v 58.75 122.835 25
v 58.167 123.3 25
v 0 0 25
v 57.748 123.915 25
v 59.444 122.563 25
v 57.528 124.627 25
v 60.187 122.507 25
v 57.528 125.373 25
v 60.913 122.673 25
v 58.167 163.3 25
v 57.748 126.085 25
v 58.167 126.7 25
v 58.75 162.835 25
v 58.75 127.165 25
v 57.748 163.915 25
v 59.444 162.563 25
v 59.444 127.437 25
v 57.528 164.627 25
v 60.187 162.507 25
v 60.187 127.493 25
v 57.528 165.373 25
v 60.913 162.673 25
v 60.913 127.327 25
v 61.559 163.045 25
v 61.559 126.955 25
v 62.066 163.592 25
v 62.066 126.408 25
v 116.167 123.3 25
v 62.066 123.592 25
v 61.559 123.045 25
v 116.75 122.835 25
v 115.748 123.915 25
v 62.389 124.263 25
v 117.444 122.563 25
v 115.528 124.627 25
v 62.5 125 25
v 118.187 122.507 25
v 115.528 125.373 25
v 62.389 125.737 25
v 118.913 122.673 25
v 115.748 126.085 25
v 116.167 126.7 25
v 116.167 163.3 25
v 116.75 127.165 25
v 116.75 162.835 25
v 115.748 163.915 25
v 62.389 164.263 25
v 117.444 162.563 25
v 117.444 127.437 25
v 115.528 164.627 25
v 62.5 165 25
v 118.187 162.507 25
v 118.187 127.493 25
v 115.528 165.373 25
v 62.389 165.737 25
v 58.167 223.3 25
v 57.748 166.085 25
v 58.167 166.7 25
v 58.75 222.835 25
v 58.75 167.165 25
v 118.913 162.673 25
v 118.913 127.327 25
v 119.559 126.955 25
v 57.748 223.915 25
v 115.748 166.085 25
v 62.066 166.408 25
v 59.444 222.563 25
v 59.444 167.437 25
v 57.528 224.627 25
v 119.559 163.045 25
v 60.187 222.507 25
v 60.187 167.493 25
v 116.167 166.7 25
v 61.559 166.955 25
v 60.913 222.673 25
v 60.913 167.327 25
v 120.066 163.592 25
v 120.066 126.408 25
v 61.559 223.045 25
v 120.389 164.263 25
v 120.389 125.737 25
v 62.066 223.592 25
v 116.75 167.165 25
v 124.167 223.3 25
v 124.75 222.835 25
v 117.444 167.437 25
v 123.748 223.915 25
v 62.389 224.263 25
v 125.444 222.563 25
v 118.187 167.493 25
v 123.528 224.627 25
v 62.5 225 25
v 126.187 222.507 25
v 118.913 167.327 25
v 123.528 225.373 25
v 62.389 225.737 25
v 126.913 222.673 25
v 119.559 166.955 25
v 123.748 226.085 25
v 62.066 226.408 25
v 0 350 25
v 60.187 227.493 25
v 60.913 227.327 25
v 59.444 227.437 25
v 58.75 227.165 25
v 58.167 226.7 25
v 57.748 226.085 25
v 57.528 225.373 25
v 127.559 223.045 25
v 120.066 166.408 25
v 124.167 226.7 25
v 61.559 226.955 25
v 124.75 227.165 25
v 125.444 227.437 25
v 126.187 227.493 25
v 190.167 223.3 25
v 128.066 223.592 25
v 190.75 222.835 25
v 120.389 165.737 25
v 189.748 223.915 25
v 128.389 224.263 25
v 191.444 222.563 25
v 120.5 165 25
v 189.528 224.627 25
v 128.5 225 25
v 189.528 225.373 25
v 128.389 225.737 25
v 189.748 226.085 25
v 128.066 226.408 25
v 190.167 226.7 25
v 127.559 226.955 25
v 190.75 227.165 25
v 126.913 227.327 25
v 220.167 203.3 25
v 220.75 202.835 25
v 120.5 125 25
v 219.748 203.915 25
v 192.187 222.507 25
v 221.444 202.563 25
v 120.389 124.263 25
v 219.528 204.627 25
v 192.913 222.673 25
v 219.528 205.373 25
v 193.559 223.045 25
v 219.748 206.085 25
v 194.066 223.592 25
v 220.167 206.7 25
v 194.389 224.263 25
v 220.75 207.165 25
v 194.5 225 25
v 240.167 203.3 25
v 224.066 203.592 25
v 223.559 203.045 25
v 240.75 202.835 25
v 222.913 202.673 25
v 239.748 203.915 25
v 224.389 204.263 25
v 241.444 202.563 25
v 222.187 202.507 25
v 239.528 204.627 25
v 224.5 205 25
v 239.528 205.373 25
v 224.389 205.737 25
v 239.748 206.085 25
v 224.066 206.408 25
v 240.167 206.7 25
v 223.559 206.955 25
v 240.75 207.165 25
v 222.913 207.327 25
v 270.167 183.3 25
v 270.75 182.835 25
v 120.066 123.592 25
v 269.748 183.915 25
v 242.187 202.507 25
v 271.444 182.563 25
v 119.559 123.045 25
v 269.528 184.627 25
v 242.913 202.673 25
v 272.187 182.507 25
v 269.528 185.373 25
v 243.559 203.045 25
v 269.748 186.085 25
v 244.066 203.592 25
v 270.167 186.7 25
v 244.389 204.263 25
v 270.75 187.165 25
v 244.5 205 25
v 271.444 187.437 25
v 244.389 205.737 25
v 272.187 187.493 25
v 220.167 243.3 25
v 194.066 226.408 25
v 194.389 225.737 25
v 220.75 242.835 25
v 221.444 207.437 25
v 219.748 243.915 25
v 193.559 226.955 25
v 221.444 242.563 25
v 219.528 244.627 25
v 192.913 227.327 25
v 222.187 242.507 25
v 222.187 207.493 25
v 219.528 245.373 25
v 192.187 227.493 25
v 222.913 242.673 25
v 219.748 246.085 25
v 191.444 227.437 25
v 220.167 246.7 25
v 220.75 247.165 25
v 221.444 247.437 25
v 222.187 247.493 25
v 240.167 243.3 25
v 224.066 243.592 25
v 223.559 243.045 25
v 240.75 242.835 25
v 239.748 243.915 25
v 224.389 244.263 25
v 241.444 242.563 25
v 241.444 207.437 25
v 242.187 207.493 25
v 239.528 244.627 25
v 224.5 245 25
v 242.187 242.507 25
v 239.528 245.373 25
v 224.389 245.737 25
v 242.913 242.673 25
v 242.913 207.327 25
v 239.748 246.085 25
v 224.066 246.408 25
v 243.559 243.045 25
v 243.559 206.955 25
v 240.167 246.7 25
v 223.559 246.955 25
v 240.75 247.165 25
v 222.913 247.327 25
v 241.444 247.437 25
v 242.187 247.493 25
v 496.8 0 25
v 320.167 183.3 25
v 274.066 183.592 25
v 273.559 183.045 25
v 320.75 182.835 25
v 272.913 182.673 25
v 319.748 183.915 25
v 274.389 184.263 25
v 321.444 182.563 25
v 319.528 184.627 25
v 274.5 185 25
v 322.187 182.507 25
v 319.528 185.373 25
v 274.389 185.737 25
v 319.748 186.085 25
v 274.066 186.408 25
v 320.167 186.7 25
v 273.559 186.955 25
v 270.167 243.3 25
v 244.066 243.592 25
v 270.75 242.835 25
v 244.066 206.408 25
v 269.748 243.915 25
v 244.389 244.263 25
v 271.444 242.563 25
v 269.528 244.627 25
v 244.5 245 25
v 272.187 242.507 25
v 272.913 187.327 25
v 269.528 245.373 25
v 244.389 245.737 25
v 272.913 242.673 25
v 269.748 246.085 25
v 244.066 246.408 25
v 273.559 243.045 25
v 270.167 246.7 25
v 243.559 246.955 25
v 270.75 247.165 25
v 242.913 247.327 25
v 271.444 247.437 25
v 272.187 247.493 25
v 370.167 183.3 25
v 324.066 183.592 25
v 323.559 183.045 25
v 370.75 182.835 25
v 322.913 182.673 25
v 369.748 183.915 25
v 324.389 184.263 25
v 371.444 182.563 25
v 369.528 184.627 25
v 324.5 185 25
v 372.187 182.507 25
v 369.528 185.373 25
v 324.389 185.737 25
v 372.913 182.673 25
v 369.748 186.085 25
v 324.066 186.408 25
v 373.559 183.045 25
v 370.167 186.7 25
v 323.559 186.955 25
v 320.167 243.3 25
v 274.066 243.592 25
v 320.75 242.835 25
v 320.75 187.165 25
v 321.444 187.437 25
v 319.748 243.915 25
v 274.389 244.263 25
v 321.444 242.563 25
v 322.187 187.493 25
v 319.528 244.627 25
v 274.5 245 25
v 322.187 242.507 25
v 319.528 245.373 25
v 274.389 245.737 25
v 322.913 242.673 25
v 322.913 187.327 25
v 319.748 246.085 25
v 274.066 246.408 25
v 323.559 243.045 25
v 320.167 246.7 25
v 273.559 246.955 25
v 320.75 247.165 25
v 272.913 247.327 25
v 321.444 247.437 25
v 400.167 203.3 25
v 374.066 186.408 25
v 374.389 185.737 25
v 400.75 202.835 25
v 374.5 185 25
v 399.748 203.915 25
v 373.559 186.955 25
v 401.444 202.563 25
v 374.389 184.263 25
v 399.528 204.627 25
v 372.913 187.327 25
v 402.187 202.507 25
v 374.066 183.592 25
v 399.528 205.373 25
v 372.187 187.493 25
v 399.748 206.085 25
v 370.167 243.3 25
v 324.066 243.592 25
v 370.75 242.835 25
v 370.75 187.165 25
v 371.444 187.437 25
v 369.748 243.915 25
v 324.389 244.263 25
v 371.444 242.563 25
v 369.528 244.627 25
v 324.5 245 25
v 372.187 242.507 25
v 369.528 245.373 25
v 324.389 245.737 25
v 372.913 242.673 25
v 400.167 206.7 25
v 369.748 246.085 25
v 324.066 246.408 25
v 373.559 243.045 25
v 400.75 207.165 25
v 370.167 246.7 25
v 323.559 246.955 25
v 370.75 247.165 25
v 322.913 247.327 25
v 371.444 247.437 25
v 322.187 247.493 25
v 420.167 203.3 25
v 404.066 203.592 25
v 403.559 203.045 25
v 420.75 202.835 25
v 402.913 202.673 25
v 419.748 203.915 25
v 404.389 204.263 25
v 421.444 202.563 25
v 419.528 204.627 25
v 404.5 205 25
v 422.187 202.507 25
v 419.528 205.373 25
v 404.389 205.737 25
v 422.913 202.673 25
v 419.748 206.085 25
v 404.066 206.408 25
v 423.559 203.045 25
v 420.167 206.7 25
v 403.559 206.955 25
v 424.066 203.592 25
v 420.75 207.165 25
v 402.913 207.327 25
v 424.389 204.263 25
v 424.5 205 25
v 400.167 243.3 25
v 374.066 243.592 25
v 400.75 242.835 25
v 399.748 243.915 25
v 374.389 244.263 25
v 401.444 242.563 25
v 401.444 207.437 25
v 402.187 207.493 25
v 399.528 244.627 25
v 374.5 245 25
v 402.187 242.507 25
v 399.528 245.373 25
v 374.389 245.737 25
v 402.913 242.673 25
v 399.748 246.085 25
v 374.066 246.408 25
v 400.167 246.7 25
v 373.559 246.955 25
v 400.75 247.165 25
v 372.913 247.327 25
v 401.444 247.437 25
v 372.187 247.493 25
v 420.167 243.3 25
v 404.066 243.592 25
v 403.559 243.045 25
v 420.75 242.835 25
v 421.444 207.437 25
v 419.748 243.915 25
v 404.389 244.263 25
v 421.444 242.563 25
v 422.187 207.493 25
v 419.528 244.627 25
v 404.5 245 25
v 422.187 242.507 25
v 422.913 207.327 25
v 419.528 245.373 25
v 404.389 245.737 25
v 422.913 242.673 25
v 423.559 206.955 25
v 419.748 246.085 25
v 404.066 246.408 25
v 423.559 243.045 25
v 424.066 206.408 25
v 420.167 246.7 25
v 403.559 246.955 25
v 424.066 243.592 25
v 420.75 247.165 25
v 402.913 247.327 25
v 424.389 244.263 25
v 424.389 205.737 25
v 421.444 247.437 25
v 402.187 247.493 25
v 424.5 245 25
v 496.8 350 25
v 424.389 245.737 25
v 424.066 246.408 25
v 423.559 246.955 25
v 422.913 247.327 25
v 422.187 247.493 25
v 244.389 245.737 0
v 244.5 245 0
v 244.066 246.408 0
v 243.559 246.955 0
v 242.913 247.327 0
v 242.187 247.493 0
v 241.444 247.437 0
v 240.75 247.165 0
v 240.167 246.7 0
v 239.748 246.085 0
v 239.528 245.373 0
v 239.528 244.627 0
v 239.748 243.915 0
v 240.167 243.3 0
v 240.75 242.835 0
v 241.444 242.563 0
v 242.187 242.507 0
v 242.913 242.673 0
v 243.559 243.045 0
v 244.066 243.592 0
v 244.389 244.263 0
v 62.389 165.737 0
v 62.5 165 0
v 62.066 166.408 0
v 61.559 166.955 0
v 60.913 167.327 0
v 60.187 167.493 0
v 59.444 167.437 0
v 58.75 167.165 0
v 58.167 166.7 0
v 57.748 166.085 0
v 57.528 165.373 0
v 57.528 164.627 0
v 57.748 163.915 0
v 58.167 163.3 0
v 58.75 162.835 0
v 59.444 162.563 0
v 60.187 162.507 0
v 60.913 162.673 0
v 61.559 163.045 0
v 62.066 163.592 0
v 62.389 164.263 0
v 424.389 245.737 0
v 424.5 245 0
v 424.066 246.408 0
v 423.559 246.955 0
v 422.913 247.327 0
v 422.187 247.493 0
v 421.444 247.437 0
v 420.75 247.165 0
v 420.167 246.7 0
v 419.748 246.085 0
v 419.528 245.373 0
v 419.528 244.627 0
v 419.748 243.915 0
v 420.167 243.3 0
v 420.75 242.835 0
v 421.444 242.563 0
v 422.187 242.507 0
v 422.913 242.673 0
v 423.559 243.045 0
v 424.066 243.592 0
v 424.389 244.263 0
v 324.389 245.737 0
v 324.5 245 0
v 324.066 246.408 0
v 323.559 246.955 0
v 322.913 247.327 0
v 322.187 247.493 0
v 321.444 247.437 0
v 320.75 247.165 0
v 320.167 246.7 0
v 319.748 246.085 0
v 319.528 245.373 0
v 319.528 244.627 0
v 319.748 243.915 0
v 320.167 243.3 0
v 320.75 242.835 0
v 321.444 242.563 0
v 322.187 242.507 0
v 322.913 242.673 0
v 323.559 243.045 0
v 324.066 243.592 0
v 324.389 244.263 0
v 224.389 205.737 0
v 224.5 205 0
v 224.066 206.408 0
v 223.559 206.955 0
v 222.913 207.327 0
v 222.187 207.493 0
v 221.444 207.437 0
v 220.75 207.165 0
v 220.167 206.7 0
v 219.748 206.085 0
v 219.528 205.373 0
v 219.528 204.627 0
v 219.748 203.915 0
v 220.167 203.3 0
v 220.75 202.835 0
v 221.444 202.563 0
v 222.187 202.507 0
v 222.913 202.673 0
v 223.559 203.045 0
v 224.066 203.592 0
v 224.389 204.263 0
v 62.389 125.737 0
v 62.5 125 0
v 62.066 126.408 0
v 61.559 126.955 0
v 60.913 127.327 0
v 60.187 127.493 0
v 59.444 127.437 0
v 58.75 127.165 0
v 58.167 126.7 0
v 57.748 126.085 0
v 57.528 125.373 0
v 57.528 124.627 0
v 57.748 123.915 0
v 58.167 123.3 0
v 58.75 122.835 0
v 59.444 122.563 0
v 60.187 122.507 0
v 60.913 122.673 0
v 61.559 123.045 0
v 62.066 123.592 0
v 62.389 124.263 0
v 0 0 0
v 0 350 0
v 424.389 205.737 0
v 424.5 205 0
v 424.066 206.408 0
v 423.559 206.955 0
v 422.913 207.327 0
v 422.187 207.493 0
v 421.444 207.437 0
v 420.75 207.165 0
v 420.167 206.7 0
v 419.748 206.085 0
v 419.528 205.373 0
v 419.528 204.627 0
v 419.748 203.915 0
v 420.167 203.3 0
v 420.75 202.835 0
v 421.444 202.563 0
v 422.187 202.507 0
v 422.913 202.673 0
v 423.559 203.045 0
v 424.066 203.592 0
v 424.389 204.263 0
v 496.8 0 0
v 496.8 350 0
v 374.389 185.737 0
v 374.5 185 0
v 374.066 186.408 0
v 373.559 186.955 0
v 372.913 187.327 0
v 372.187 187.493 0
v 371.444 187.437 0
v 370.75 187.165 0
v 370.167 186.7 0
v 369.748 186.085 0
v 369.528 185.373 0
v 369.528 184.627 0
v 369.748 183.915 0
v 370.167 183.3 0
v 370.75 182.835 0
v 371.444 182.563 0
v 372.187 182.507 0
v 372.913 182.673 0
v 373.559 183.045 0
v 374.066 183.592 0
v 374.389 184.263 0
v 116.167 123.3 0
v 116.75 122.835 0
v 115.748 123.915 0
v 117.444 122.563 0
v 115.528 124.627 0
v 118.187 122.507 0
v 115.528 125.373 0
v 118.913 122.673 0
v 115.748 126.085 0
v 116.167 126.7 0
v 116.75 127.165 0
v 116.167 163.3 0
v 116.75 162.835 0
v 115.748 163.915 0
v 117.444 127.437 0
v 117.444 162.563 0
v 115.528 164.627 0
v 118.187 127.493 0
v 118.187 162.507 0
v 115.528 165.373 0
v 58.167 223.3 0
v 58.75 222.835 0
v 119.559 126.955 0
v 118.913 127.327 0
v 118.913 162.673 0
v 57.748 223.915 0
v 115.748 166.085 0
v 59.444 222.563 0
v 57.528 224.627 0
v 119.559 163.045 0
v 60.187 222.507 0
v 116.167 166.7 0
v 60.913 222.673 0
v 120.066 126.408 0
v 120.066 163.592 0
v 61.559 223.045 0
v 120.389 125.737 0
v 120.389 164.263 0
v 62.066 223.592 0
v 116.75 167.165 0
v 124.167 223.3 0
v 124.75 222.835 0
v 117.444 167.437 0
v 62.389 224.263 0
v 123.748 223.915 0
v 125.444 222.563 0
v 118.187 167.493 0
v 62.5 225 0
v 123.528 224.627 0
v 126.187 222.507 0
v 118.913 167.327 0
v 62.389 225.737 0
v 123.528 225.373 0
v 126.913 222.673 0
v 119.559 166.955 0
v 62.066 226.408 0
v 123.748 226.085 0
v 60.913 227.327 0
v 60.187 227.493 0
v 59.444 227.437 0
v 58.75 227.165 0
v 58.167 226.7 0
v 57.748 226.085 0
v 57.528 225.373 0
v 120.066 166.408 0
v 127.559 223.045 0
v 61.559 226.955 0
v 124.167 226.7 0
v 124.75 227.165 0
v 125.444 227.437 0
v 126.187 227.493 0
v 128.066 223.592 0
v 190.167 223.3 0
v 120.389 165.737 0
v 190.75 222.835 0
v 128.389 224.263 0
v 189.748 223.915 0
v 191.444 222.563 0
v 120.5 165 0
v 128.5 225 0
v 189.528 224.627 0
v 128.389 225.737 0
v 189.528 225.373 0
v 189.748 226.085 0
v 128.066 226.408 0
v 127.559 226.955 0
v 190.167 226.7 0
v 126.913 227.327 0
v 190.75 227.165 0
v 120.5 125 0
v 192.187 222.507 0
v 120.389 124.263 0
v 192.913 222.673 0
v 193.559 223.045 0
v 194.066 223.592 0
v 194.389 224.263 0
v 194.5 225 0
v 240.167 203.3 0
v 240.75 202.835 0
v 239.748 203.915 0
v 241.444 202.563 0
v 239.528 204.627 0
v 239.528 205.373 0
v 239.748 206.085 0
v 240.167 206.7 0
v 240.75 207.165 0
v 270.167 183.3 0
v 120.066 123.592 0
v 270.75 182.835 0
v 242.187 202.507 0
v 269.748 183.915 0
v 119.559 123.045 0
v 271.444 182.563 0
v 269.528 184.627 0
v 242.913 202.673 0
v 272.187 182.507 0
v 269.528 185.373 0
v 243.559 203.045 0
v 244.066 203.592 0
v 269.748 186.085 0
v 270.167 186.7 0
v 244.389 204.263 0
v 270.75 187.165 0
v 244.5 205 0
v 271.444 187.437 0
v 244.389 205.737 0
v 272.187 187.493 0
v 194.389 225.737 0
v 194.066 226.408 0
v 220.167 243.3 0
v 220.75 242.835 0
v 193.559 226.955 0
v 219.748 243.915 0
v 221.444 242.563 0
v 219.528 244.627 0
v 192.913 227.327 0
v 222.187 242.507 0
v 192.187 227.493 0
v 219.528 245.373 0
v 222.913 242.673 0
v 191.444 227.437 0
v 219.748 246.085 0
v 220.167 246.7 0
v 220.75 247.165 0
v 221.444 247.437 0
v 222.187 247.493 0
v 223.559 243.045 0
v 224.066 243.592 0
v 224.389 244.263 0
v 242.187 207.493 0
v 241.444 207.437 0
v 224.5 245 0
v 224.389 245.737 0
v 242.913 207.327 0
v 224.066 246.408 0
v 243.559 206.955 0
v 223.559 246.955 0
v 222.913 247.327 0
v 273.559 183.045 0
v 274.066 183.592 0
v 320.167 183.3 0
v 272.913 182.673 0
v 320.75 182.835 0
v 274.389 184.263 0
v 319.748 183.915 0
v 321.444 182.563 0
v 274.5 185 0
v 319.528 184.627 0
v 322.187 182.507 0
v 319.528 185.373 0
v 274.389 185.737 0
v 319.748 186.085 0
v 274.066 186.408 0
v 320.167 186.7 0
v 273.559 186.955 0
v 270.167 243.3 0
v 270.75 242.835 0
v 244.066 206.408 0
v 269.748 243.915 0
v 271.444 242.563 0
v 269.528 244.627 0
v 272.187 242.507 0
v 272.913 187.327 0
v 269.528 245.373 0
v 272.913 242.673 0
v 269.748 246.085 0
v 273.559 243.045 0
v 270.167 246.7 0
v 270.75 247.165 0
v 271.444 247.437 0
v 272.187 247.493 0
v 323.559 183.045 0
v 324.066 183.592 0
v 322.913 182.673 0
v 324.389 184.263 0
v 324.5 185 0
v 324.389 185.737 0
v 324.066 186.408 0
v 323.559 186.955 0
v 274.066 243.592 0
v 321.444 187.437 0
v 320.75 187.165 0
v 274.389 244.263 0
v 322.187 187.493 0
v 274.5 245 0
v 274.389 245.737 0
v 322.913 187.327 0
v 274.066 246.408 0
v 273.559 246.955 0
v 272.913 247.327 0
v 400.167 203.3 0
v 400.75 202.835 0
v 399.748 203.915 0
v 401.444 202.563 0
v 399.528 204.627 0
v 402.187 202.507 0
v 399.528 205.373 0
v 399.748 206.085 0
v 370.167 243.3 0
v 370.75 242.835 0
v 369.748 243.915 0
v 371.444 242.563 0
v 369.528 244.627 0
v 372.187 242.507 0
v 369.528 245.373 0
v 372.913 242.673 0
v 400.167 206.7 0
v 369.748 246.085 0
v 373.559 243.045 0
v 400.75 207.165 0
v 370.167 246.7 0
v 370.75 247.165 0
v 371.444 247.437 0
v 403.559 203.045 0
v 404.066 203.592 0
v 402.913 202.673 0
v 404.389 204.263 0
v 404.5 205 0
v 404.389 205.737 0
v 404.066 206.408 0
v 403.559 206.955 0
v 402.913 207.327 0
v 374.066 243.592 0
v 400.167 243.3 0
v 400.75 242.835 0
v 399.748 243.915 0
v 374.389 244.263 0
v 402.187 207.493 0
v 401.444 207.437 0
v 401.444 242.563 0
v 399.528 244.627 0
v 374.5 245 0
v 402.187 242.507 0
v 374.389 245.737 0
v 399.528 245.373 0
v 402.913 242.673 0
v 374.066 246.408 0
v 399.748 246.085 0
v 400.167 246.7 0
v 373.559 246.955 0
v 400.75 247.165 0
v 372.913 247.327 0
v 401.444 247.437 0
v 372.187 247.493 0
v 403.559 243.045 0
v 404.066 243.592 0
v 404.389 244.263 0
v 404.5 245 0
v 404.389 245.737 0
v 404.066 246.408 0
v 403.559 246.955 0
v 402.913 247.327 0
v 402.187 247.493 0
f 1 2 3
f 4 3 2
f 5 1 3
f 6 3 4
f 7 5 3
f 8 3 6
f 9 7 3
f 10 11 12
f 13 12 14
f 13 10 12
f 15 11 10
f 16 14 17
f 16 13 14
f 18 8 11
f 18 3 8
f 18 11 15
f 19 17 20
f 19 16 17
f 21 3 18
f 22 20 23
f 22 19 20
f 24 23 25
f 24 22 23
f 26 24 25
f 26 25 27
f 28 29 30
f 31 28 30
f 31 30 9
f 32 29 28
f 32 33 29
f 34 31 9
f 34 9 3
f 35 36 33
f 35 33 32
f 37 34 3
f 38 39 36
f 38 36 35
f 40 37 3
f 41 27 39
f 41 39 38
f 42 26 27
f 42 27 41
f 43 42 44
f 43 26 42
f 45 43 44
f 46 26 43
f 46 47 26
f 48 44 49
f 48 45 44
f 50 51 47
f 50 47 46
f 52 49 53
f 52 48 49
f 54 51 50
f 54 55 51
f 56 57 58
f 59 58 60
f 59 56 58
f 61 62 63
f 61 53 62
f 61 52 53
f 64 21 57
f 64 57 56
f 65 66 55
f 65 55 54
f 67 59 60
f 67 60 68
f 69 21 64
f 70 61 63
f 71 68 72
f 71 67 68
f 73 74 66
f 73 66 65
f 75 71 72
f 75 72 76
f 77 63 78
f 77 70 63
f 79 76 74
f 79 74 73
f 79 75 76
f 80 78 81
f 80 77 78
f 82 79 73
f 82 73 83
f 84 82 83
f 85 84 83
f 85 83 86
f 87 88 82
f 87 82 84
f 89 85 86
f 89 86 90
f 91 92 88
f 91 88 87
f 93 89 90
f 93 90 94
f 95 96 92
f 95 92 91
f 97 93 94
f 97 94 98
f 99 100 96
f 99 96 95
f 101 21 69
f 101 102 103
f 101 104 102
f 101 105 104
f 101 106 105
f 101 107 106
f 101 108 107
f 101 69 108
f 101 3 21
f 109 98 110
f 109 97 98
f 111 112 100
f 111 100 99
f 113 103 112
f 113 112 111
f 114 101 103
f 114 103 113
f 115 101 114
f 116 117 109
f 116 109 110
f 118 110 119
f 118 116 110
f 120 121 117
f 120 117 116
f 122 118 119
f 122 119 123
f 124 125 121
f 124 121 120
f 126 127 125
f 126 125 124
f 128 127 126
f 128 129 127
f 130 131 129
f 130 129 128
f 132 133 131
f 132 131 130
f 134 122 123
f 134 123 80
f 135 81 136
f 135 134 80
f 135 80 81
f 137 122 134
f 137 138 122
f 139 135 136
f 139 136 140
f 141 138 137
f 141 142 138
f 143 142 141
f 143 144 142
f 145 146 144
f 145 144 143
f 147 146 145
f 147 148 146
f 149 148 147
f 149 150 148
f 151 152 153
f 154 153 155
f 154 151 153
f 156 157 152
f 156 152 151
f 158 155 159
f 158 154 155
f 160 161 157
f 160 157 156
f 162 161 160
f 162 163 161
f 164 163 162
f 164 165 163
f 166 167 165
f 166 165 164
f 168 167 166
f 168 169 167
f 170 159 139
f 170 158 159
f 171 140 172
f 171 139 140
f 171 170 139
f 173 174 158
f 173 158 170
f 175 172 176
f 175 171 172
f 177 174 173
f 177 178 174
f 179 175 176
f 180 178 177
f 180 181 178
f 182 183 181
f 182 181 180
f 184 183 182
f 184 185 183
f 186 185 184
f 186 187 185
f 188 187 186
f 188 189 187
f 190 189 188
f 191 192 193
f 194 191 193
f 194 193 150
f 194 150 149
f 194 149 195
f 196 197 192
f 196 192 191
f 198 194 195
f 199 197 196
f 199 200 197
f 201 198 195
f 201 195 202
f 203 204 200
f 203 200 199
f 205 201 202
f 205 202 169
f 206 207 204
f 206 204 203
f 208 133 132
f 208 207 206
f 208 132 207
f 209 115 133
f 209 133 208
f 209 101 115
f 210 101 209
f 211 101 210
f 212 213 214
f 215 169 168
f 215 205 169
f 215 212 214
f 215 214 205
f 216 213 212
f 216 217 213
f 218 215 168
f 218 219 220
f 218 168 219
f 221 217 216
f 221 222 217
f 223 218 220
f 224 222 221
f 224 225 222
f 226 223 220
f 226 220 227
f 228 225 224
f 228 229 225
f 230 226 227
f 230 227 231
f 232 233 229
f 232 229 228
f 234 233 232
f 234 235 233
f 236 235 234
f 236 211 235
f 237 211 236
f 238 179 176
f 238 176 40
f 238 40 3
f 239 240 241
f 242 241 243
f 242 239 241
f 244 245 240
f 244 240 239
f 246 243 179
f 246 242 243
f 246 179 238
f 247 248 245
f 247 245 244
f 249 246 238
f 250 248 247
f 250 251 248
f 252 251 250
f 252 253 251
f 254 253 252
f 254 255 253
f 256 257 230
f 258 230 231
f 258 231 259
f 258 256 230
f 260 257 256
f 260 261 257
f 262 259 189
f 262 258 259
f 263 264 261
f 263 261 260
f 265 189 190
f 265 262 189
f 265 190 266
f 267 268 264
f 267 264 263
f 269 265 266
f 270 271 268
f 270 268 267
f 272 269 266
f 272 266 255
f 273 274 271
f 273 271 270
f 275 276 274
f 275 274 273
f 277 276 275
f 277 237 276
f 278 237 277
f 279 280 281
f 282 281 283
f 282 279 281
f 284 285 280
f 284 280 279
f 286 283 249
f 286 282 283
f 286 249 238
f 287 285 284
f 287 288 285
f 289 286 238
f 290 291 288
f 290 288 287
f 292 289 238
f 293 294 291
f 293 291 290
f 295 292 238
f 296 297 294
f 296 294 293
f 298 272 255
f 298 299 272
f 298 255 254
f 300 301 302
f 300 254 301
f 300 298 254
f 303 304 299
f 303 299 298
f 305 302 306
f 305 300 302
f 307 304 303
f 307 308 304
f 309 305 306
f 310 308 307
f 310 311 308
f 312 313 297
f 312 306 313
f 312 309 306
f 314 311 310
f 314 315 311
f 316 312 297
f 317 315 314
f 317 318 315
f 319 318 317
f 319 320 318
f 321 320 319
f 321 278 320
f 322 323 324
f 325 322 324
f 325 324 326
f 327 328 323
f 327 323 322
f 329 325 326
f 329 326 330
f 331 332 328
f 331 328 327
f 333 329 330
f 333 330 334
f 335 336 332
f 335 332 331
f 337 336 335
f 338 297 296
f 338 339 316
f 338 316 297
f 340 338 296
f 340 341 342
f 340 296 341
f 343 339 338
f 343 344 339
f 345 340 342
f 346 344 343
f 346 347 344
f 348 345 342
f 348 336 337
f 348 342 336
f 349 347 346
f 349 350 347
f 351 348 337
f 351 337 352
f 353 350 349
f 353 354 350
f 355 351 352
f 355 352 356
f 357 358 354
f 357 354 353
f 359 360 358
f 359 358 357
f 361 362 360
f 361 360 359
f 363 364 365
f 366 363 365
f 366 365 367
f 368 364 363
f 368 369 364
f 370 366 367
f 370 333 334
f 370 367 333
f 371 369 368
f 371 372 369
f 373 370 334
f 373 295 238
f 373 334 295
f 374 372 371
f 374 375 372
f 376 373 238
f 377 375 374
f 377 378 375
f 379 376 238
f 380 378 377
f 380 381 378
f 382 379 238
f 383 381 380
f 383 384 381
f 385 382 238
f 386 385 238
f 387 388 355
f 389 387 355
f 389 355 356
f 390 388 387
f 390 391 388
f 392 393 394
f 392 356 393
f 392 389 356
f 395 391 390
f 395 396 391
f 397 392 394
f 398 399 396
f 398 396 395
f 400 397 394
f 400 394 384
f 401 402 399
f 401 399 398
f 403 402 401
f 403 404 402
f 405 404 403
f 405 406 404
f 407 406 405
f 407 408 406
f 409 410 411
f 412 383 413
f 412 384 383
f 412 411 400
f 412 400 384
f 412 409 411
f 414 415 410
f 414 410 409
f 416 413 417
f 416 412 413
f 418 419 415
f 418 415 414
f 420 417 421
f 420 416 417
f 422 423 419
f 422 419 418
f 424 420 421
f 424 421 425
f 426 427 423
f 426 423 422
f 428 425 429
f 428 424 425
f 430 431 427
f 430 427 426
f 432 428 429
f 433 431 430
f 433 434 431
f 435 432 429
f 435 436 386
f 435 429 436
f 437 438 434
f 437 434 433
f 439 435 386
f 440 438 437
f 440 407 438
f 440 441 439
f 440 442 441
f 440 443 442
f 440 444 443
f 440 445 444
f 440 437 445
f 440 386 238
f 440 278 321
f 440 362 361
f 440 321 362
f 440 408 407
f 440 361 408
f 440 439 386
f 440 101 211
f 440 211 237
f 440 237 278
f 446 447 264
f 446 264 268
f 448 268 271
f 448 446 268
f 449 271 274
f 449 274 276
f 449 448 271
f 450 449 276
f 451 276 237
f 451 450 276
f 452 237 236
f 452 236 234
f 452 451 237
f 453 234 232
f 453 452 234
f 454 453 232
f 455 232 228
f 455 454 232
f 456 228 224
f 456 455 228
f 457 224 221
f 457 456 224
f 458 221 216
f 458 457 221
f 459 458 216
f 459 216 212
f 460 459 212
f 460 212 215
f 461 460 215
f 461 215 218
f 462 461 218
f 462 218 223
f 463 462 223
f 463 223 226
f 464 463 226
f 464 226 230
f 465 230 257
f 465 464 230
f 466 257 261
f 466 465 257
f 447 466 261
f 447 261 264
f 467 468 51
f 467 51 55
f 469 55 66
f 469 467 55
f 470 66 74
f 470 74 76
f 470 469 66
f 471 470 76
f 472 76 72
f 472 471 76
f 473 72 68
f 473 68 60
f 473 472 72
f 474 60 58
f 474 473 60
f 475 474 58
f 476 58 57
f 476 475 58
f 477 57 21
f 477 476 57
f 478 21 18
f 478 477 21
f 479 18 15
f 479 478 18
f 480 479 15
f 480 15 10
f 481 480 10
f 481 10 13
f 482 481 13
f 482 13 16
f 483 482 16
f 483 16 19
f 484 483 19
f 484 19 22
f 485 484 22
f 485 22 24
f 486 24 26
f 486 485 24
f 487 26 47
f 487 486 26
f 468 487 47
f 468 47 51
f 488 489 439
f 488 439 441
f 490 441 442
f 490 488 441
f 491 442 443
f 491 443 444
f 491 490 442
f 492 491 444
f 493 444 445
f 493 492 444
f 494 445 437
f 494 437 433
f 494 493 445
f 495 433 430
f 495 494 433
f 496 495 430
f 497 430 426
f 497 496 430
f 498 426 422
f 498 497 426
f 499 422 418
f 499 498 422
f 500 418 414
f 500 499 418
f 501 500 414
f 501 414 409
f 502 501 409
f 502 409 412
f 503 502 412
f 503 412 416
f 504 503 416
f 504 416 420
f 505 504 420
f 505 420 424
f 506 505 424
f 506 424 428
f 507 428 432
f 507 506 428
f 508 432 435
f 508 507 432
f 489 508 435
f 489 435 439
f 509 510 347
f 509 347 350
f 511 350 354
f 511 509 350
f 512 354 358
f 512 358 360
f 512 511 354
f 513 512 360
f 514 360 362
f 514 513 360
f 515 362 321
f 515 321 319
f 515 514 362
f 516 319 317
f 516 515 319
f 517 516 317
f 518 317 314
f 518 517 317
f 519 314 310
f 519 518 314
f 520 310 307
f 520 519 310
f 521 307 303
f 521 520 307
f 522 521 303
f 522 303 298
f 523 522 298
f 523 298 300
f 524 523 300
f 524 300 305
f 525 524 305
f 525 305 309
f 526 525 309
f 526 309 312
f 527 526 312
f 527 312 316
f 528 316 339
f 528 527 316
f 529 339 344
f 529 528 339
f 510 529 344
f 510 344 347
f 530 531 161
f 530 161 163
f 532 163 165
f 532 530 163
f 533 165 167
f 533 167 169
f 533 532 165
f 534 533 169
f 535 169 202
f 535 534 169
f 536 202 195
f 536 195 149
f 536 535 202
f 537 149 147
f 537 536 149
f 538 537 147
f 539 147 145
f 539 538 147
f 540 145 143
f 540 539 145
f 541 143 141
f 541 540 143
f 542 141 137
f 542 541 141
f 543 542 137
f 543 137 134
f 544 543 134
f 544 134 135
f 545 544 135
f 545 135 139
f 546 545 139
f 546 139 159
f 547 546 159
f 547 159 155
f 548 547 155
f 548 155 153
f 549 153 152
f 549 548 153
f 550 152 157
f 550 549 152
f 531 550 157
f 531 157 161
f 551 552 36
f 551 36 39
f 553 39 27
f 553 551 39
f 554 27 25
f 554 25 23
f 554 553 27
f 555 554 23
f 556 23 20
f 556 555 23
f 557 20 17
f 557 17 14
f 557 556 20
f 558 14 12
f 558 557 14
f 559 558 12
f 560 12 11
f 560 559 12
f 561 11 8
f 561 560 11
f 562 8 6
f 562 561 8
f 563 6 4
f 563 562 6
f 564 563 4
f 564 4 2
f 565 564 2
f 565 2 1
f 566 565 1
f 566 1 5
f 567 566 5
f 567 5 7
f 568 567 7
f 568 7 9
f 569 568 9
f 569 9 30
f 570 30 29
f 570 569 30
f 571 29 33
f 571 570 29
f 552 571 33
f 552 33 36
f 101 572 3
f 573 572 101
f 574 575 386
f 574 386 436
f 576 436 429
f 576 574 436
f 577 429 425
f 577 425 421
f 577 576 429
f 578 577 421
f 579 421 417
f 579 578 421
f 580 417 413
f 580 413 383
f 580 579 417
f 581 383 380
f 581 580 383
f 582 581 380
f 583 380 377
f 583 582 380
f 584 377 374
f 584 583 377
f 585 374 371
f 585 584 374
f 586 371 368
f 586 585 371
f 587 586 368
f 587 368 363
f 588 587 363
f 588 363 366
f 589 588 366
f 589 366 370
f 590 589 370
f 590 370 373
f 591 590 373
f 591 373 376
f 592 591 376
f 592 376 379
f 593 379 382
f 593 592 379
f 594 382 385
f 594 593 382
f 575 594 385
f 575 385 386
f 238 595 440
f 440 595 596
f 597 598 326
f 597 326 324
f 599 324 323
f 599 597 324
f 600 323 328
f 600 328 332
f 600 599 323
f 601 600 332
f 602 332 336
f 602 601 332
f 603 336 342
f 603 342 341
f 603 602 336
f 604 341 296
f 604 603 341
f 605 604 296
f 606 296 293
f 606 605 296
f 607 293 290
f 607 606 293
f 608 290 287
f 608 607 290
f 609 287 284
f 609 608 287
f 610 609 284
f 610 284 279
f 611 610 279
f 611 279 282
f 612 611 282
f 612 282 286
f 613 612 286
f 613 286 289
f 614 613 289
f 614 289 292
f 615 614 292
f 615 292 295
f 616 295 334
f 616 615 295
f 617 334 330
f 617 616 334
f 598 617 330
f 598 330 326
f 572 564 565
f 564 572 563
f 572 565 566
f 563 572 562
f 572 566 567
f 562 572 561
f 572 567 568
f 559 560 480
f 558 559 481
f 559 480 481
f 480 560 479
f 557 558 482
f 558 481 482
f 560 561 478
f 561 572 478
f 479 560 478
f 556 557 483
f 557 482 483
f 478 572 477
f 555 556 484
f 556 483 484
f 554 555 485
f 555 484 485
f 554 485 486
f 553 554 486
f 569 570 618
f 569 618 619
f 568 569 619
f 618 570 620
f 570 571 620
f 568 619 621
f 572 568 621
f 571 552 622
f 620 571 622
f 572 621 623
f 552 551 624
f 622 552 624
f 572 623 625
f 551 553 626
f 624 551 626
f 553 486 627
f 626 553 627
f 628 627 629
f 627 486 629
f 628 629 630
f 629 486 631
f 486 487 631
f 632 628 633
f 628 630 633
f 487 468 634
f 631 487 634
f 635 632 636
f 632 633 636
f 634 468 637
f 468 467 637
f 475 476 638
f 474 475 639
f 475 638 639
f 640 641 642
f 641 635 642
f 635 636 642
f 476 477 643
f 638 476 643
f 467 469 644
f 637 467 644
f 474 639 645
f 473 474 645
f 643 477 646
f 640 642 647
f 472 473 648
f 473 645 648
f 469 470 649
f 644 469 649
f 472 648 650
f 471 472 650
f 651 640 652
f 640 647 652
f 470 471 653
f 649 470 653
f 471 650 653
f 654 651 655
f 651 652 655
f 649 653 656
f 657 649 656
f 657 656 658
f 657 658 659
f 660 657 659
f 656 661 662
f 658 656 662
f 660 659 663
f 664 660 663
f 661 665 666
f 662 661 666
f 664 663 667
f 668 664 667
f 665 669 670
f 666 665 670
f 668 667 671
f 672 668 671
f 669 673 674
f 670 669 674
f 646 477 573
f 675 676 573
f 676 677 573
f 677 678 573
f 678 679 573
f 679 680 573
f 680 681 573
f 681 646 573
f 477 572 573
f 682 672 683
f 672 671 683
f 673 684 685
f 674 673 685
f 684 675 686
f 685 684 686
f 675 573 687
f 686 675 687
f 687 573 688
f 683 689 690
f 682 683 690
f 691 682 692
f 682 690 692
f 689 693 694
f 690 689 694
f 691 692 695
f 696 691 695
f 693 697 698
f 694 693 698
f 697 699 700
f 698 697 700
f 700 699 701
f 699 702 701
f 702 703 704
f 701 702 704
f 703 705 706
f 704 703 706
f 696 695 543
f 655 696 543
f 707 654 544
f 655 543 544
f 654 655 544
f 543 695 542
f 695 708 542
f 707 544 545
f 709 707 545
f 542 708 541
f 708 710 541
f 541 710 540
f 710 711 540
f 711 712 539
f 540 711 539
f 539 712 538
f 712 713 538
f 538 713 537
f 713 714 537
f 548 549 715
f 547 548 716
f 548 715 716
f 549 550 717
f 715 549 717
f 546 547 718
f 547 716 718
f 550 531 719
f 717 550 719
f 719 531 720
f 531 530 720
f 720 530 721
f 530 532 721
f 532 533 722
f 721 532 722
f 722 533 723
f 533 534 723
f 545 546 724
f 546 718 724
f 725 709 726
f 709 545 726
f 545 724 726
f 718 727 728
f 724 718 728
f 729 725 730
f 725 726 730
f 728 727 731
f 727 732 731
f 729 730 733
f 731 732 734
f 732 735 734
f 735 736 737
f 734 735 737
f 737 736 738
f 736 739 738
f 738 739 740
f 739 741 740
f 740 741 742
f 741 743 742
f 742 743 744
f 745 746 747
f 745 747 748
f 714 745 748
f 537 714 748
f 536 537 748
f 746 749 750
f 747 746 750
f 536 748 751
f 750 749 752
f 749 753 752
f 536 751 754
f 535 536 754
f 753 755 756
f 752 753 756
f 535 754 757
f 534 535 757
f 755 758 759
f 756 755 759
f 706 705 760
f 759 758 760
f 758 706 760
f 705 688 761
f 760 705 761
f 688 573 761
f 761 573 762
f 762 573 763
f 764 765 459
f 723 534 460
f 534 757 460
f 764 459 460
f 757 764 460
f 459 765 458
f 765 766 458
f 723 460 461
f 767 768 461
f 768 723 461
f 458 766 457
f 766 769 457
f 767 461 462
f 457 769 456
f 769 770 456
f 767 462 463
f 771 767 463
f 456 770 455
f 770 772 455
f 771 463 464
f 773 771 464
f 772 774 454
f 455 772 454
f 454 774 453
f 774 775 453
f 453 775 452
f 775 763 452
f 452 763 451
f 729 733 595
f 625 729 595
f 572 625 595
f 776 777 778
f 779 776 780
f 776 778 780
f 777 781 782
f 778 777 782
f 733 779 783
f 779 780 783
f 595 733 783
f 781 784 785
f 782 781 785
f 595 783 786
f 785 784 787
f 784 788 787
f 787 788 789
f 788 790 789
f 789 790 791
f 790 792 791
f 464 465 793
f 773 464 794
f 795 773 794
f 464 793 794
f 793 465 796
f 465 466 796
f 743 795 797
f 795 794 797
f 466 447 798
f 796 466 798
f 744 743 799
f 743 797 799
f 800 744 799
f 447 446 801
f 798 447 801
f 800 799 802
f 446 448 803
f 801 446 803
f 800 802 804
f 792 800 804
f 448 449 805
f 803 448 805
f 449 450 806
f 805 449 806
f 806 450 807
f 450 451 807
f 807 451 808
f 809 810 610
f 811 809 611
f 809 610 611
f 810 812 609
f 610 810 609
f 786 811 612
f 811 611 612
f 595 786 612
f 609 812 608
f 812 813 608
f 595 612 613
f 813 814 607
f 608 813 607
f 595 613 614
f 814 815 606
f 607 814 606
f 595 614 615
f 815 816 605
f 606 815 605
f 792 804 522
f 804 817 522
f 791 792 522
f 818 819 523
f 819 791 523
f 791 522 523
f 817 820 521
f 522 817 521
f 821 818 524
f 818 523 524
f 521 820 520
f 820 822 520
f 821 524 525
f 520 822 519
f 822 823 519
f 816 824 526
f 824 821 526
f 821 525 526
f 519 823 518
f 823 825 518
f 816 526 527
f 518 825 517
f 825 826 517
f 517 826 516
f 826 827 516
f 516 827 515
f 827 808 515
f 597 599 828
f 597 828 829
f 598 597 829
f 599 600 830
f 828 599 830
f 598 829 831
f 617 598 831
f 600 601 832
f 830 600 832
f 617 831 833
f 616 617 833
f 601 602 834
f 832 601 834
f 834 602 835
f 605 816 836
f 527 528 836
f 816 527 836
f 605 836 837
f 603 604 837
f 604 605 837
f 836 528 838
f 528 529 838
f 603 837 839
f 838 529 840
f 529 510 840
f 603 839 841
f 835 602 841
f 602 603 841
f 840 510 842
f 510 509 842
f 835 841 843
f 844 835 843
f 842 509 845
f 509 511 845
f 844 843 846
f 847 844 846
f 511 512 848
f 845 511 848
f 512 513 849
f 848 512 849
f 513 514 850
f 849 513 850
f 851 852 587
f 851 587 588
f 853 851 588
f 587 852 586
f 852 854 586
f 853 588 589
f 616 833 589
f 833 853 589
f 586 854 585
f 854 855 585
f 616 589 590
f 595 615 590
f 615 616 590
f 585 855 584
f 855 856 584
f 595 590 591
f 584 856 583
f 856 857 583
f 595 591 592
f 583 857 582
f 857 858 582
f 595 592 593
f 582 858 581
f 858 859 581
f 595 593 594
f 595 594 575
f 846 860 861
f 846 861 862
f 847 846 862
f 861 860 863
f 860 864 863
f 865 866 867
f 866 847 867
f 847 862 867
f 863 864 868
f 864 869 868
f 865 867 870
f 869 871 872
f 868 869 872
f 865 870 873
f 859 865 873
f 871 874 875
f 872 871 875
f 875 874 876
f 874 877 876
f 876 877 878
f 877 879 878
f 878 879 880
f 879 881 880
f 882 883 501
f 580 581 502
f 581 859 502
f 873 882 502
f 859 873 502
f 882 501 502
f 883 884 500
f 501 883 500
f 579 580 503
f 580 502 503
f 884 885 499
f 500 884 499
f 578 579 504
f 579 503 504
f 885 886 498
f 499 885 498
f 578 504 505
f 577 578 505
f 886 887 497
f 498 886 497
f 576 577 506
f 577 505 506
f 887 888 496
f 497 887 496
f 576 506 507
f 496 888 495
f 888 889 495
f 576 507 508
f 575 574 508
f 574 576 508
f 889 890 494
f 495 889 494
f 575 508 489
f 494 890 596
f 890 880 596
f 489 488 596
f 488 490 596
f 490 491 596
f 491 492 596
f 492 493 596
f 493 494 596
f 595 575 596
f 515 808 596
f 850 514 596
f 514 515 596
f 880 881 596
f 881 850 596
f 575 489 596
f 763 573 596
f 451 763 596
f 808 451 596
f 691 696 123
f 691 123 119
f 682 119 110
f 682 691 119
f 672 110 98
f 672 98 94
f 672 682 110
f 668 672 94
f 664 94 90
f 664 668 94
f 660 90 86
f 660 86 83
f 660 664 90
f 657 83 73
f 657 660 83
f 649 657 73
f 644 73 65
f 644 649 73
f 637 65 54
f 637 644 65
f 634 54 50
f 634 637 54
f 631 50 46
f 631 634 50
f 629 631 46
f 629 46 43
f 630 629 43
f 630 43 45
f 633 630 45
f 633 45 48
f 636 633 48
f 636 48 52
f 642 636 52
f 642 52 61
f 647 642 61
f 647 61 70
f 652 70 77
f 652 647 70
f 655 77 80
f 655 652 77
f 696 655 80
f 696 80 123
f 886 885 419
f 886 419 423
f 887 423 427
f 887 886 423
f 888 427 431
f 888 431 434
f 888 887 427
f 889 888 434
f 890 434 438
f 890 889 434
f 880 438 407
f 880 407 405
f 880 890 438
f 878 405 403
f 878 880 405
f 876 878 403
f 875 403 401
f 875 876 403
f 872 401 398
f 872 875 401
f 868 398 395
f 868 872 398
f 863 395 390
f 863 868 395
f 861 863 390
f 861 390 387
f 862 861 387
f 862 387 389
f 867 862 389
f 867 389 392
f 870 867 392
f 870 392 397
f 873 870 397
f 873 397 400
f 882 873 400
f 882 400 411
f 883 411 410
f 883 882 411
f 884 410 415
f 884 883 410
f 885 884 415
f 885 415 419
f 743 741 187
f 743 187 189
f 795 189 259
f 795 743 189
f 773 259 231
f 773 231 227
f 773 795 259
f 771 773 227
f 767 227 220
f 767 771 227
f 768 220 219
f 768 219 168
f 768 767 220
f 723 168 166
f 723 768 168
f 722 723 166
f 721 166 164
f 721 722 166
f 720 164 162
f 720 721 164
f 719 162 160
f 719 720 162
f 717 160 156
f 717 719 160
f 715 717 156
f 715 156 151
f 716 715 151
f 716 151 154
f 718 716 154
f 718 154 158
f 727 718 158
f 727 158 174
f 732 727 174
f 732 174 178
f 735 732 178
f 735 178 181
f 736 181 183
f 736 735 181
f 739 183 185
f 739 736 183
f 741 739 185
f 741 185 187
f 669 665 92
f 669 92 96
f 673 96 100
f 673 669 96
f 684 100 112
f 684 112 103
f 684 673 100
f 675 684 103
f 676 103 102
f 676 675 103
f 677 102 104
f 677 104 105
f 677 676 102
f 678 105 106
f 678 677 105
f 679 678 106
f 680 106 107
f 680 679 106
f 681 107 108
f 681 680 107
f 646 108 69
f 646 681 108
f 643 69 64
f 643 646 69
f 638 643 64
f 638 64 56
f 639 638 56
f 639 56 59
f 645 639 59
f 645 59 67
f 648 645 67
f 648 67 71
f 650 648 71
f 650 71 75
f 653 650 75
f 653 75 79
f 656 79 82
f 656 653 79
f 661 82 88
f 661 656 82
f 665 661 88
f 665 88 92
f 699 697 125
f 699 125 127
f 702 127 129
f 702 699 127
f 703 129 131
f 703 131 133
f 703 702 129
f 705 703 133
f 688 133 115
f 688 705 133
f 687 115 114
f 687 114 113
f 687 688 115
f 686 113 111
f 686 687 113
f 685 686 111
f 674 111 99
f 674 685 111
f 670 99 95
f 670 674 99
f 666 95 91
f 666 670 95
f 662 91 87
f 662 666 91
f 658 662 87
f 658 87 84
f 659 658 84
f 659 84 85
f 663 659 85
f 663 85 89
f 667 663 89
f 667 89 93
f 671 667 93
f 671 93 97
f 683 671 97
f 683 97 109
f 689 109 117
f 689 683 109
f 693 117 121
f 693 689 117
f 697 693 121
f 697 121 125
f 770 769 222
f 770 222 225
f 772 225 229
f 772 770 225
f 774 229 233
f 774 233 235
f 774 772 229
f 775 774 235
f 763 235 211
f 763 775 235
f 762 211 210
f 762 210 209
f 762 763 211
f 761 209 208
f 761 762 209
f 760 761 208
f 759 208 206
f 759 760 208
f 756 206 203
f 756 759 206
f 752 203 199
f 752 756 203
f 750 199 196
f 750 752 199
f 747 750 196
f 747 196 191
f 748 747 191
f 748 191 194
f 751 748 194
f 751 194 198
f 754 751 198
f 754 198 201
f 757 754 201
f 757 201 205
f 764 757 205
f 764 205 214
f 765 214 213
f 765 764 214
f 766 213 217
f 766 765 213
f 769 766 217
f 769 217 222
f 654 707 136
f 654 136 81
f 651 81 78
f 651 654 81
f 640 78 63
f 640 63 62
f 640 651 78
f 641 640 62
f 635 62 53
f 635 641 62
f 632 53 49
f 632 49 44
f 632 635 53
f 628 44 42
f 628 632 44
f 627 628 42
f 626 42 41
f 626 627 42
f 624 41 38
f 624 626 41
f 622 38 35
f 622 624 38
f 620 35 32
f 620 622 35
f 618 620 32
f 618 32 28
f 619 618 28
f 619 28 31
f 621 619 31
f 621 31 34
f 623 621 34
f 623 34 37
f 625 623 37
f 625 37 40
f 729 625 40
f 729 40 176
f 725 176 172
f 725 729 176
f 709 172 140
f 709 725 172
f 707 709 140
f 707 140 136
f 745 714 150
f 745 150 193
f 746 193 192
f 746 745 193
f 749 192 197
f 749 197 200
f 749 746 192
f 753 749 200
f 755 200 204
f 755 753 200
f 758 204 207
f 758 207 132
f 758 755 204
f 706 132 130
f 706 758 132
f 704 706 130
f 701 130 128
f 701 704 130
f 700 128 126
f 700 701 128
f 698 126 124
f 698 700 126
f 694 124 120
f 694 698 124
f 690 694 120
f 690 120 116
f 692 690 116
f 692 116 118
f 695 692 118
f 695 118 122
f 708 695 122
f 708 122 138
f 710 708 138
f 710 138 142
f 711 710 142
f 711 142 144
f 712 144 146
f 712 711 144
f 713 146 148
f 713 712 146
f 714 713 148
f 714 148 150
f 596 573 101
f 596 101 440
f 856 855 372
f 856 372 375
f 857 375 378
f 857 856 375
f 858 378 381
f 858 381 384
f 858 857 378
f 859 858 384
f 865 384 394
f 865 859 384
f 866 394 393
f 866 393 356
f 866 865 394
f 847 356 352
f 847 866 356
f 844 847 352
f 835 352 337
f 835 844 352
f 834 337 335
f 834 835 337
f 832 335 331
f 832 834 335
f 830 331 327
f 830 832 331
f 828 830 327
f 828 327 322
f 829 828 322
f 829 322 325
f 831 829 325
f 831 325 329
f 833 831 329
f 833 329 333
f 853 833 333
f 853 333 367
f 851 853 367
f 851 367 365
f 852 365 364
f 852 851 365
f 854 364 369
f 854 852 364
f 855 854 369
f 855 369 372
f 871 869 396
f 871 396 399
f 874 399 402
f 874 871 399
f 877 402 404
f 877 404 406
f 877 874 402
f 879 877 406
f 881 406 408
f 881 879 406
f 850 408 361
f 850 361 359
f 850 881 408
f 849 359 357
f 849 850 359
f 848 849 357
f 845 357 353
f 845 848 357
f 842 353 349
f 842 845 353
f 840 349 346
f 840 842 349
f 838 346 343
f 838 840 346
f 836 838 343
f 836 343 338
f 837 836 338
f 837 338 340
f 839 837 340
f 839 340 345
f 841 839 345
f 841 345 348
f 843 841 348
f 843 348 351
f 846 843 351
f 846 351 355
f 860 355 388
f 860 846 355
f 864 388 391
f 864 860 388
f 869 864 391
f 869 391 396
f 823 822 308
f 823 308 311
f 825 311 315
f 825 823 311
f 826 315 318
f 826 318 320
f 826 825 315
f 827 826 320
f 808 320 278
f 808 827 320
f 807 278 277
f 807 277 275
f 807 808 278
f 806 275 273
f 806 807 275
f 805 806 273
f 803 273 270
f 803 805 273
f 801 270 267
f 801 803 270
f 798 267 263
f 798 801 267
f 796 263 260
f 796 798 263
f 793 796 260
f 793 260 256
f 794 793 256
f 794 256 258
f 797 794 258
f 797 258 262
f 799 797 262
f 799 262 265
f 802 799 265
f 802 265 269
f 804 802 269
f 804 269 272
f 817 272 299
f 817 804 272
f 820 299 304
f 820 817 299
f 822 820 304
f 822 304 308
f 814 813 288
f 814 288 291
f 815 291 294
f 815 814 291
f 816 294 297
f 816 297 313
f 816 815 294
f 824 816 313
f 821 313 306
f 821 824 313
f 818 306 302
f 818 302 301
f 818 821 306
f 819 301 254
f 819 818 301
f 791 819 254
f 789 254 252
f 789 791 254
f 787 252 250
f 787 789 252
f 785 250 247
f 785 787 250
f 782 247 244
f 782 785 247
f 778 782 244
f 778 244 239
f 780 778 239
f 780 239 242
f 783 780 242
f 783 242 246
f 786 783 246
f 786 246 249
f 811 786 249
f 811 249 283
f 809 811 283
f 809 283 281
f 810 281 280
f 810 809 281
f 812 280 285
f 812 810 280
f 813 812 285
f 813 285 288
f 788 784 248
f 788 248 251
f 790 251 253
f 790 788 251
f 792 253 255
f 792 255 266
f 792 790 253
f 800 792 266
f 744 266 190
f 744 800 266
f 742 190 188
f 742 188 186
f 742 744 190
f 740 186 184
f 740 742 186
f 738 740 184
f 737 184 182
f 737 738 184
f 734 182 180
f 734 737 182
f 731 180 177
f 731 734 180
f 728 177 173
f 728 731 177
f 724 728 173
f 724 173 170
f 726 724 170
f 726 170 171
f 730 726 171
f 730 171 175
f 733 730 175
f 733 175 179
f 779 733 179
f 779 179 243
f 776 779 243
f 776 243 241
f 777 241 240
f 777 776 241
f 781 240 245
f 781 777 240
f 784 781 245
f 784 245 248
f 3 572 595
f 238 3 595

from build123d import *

# Parameters (mm, degrees)
F0_W     = 496.8
F0_H     = 350
F0_R     = 2.5
F1_DEPTH = 25


with BuildPart() as f1:
    # F0 (on Top) → F1 (new body)
    with BuildSketch(Plane.XY):
        with Locations((248.4, 175)):
            Rectangle(F0_W, F0_H)
        with Locations((60, 125)):
            Circle(F0_R, mode=Mode.SUBTRACT)
        with Locations((118, 125)):
            Circle(F0_R, mode=Mode.SUBTRACT)
        with Locations((60, 165)):
            Circle(F0_R, mode=Mode.SUBTRACT)
        with Locations((118, 165)):
            Circle(F0_R, mode=Mode.SUBTRACT)
        with Locations((60, 225)):
            Circle(F0_R, mode=Mode.SUBTRACT)
        with Locations((222, 205)):
            Circle(F0_R, mode=Mode.SUBTRACT)
        with Locations((242, 205)):
            Circle(F0_R, mode=Mode.SUBTRACT)
        with Locations((126, 225)):
            Circle(F0_R, mode=Mode.SUBTRACT)
        with Locations((192, 225)):
            Circle(F0_R, mode=Mode.SUBTRACT)
        with Locations((222, 245)):
            Circle(F0_R, mode=Mode.SUBTRACT)
        with Locations((242, 245)):
            Circle(F0_R, mode=Mode.SUBTRACT)
        with Locations((272, 185)):
            Circle(F0_R, mode=Mode.SUBTRACT)
        with Locations((322, 185)):
            Circle(F0_R, mode=Mode.SUBTRACT)
        with Locations((372, 185)):
            Circle(F0_R, mode=Mode.SUBTRACT)
        with Locations((272, 245)):
            Circle(F0_R, mode=Mode.SUBTRACT)
        with Locations((322, 245)):
            Circle(F0_R, mode=Mode.SUBTRACT)
        with Locations((372, 245)):
            Circle(F0_R, mode=Mode.SUBTRACT)
        with Locations((402, 205)):
            Circle(F0_R, mode=Mode.SUBTRACT)
        with Locations((422, 205)):
            Circle(F0_R, mode=Mode.SUBTRACT)
        with Locations((402, 245)):
            Circle(F0_R, mode=Mode.SUBTRACT)
        with Locations((422, 245)):
            Circle(F0_R, mode=Mode.SUBTRACT)
    extrude(amount=F1_DEPTH)


solid = f1.part
